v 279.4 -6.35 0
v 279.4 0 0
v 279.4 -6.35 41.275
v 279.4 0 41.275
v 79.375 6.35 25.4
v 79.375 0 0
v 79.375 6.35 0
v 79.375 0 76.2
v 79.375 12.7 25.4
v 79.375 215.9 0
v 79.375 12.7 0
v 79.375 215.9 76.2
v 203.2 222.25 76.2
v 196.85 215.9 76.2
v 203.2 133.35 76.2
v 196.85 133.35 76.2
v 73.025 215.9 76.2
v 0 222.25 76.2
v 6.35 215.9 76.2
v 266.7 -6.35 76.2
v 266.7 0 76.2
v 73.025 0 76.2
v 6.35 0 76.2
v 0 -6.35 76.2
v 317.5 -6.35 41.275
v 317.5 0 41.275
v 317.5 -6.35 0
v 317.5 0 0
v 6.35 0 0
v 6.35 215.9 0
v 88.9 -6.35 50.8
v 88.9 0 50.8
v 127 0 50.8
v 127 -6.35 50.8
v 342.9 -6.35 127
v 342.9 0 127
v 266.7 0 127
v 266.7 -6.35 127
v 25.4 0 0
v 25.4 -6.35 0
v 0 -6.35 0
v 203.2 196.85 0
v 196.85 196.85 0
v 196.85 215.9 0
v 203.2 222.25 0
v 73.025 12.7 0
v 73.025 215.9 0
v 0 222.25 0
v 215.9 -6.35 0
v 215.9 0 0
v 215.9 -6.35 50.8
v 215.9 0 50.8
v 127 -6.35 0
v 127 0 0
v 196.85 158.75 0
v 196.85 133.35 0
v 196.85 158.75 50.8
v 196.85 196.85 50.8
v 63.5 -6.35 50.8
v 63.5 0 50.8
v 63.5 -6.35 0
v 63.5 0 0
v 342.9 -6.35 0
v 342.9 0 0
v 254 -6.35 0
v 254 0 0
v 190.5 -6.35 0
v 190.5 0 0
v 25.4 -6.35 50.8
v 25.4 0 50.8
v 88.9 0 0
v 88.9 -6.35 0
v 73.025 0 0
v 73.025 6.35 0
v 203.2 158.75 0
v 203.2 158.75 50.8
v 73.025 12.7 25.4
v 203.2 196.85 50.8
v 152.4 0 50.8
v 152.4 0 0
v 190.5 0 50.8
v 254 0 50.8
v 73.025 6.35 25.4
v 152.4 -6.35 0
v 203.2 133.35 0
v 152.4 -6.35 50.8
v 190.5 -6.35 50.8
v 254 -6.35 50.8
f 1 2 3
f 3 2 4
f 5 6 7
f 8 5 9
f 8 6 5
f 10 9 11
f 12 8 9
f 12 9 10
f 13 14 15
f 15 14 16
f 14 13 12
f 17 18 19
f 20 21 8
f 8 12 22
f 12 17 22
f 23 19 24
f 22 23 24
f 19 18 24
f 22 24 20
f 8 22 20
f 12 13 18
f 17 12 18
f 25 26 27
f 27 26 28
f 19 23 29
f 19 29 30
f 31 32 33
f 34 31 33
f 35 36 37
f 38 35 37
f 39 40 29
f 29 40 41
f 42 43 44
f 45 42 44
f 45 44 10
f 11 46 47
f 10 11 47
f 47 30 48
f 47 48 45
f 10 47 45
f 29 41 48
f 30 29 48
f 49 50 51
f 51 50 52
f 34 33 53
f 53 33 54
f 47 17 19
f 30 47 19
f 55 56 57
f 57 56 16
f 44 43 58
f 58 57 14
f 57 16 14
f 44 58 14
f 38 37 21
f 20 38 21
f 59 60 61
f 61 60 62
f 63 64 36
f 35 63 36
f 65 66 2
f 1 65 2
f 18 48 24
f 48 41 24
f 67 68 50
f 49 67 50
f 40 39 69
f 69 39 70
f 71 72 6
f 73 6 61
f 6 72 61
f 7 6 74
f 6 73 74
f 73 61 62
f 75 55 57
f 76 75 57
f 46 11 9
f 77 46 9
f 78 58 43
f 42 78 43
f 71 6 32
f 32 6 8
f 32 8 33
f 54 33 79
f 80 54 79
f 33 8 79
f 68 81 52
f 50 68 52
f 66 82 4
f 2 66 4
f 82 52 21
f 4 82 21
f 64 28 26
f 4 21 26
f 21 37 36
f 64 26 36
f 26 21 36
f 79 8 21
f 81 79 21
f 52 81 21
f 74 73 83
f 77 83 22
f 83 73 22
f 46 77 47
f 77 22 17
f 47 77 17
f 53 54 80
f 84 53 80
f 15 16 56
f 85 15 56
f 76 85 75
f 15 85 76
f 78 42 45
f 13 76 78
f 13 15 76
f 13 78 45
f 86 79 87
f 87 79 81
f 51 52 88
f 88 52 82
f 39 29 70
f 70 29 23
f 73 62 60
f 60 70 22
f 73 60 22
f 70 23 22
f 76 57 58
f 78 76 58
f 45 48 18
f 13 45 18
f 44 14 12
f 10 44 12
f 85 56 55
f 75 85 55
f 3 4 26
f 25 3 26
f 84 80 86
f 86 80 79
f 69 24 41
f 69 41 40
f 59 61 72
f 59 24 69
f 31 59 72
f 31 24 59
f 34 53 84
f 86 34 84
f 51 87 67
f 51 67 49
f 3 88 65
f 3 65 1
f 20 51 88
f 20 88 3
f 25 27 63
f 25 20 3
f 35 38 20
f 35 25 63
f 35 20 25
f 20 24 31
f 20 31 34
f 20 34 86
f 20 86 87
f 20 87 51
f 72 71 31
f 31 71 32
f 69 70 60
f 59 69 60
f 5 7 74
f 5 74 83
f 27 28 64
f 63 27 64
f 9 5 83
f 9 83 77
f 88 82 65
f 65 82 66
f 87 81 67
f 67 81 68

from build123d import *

# Parameters (mm, degrees)
F1_DEPTH  = 6.35
F2_W      = 215.9
F2_H      = 76.2
F3_DEPTH  = 6.35
F4_W      = 196.85
F4_H      = 76.2
F5_DEPTH  = 6.35
F7_DEPTH  = 6.35
F8_W      = 6.35
F8_H      = 215.9
F9_DEPTH  = 76.2
F10_W     = 6.35
F10_H     = 25.4
F11_DEPTH = 12.7


with BuildPart() as f1:
    # F0 (on Front) → F1 (new body)
    with BuildSketch(Plane.XZ):
        Polygon((0, 76.2), (0, 0), (25.4, 0), (25.4, 50.8), (63.5, 50.8), (63.5, 0), (88.9, 0), (88.9, 50.8), (127, 50.8), (127, 0), (152.4, 0), (152.4, 50.8), (190.5, 50.8), (190.5, 0), (215.9, 0), (215.9, 50.8), (254, 50.8), (254, 0), (279.4, 0), (279.4, 41.275), (317.5, 41.275), (317.5, 0), (342.9, 0), (342.9, 127), (266.7, 127), (266.7, 76.2), align=None)
    extrude(amount=F1_DEPTH)

    # F2 (on Right) → F3 (join)
    with BuildSketch(Plane.YZ):
        with Locations((107.95, 38.1)):
            Rectangle(F2_W, F2_H)
    extrude(amount=F3_DEPTH)

    # F4 (on face) → F5 (join)
    with BuildSketch(Plane(origin=(0, 215.9, 0), x_dir=(-1, 0, 0), z_dir=(0, 1, 0))):
        with Locations((-98.425, 38.1)):
            Rectangle(F4_W, F4_H)
    extrude(amount=F5_DEPTH)

    # F6 (on face) → F7 (join)
    with BuildSketch(Plane.YZ.offset(196.85)):
        Polygon((222.25, 0), (222.25, 76.2), (133.35, 76.2), (133.35, 0), (158.75, 0), (158.75, 50.8), (196.85, 50.8), (196.85, 0), align=None)
    extrude(amount=F7_DEPTH)

    # F8 (on face) → F9 (join)
    with BuildSketch(Plane.XY.offset(76.2)):
        with Locations((76.2, 107.95)):
            Rectangle(F8_W, F8_H)
    extrude(amount=-F9_DEPTH)

    # F10 (on face) → F11 (cut)
    with BuildSketch(Plane.YZ.offset(79.375)):
        with Locations((9.525, 12.7)):
            Rectangle(F10_W, F10_H)
    extrude(amount=-F11_DEPTH, mode=Mode.SUBTRACT)


solid = f1.part
